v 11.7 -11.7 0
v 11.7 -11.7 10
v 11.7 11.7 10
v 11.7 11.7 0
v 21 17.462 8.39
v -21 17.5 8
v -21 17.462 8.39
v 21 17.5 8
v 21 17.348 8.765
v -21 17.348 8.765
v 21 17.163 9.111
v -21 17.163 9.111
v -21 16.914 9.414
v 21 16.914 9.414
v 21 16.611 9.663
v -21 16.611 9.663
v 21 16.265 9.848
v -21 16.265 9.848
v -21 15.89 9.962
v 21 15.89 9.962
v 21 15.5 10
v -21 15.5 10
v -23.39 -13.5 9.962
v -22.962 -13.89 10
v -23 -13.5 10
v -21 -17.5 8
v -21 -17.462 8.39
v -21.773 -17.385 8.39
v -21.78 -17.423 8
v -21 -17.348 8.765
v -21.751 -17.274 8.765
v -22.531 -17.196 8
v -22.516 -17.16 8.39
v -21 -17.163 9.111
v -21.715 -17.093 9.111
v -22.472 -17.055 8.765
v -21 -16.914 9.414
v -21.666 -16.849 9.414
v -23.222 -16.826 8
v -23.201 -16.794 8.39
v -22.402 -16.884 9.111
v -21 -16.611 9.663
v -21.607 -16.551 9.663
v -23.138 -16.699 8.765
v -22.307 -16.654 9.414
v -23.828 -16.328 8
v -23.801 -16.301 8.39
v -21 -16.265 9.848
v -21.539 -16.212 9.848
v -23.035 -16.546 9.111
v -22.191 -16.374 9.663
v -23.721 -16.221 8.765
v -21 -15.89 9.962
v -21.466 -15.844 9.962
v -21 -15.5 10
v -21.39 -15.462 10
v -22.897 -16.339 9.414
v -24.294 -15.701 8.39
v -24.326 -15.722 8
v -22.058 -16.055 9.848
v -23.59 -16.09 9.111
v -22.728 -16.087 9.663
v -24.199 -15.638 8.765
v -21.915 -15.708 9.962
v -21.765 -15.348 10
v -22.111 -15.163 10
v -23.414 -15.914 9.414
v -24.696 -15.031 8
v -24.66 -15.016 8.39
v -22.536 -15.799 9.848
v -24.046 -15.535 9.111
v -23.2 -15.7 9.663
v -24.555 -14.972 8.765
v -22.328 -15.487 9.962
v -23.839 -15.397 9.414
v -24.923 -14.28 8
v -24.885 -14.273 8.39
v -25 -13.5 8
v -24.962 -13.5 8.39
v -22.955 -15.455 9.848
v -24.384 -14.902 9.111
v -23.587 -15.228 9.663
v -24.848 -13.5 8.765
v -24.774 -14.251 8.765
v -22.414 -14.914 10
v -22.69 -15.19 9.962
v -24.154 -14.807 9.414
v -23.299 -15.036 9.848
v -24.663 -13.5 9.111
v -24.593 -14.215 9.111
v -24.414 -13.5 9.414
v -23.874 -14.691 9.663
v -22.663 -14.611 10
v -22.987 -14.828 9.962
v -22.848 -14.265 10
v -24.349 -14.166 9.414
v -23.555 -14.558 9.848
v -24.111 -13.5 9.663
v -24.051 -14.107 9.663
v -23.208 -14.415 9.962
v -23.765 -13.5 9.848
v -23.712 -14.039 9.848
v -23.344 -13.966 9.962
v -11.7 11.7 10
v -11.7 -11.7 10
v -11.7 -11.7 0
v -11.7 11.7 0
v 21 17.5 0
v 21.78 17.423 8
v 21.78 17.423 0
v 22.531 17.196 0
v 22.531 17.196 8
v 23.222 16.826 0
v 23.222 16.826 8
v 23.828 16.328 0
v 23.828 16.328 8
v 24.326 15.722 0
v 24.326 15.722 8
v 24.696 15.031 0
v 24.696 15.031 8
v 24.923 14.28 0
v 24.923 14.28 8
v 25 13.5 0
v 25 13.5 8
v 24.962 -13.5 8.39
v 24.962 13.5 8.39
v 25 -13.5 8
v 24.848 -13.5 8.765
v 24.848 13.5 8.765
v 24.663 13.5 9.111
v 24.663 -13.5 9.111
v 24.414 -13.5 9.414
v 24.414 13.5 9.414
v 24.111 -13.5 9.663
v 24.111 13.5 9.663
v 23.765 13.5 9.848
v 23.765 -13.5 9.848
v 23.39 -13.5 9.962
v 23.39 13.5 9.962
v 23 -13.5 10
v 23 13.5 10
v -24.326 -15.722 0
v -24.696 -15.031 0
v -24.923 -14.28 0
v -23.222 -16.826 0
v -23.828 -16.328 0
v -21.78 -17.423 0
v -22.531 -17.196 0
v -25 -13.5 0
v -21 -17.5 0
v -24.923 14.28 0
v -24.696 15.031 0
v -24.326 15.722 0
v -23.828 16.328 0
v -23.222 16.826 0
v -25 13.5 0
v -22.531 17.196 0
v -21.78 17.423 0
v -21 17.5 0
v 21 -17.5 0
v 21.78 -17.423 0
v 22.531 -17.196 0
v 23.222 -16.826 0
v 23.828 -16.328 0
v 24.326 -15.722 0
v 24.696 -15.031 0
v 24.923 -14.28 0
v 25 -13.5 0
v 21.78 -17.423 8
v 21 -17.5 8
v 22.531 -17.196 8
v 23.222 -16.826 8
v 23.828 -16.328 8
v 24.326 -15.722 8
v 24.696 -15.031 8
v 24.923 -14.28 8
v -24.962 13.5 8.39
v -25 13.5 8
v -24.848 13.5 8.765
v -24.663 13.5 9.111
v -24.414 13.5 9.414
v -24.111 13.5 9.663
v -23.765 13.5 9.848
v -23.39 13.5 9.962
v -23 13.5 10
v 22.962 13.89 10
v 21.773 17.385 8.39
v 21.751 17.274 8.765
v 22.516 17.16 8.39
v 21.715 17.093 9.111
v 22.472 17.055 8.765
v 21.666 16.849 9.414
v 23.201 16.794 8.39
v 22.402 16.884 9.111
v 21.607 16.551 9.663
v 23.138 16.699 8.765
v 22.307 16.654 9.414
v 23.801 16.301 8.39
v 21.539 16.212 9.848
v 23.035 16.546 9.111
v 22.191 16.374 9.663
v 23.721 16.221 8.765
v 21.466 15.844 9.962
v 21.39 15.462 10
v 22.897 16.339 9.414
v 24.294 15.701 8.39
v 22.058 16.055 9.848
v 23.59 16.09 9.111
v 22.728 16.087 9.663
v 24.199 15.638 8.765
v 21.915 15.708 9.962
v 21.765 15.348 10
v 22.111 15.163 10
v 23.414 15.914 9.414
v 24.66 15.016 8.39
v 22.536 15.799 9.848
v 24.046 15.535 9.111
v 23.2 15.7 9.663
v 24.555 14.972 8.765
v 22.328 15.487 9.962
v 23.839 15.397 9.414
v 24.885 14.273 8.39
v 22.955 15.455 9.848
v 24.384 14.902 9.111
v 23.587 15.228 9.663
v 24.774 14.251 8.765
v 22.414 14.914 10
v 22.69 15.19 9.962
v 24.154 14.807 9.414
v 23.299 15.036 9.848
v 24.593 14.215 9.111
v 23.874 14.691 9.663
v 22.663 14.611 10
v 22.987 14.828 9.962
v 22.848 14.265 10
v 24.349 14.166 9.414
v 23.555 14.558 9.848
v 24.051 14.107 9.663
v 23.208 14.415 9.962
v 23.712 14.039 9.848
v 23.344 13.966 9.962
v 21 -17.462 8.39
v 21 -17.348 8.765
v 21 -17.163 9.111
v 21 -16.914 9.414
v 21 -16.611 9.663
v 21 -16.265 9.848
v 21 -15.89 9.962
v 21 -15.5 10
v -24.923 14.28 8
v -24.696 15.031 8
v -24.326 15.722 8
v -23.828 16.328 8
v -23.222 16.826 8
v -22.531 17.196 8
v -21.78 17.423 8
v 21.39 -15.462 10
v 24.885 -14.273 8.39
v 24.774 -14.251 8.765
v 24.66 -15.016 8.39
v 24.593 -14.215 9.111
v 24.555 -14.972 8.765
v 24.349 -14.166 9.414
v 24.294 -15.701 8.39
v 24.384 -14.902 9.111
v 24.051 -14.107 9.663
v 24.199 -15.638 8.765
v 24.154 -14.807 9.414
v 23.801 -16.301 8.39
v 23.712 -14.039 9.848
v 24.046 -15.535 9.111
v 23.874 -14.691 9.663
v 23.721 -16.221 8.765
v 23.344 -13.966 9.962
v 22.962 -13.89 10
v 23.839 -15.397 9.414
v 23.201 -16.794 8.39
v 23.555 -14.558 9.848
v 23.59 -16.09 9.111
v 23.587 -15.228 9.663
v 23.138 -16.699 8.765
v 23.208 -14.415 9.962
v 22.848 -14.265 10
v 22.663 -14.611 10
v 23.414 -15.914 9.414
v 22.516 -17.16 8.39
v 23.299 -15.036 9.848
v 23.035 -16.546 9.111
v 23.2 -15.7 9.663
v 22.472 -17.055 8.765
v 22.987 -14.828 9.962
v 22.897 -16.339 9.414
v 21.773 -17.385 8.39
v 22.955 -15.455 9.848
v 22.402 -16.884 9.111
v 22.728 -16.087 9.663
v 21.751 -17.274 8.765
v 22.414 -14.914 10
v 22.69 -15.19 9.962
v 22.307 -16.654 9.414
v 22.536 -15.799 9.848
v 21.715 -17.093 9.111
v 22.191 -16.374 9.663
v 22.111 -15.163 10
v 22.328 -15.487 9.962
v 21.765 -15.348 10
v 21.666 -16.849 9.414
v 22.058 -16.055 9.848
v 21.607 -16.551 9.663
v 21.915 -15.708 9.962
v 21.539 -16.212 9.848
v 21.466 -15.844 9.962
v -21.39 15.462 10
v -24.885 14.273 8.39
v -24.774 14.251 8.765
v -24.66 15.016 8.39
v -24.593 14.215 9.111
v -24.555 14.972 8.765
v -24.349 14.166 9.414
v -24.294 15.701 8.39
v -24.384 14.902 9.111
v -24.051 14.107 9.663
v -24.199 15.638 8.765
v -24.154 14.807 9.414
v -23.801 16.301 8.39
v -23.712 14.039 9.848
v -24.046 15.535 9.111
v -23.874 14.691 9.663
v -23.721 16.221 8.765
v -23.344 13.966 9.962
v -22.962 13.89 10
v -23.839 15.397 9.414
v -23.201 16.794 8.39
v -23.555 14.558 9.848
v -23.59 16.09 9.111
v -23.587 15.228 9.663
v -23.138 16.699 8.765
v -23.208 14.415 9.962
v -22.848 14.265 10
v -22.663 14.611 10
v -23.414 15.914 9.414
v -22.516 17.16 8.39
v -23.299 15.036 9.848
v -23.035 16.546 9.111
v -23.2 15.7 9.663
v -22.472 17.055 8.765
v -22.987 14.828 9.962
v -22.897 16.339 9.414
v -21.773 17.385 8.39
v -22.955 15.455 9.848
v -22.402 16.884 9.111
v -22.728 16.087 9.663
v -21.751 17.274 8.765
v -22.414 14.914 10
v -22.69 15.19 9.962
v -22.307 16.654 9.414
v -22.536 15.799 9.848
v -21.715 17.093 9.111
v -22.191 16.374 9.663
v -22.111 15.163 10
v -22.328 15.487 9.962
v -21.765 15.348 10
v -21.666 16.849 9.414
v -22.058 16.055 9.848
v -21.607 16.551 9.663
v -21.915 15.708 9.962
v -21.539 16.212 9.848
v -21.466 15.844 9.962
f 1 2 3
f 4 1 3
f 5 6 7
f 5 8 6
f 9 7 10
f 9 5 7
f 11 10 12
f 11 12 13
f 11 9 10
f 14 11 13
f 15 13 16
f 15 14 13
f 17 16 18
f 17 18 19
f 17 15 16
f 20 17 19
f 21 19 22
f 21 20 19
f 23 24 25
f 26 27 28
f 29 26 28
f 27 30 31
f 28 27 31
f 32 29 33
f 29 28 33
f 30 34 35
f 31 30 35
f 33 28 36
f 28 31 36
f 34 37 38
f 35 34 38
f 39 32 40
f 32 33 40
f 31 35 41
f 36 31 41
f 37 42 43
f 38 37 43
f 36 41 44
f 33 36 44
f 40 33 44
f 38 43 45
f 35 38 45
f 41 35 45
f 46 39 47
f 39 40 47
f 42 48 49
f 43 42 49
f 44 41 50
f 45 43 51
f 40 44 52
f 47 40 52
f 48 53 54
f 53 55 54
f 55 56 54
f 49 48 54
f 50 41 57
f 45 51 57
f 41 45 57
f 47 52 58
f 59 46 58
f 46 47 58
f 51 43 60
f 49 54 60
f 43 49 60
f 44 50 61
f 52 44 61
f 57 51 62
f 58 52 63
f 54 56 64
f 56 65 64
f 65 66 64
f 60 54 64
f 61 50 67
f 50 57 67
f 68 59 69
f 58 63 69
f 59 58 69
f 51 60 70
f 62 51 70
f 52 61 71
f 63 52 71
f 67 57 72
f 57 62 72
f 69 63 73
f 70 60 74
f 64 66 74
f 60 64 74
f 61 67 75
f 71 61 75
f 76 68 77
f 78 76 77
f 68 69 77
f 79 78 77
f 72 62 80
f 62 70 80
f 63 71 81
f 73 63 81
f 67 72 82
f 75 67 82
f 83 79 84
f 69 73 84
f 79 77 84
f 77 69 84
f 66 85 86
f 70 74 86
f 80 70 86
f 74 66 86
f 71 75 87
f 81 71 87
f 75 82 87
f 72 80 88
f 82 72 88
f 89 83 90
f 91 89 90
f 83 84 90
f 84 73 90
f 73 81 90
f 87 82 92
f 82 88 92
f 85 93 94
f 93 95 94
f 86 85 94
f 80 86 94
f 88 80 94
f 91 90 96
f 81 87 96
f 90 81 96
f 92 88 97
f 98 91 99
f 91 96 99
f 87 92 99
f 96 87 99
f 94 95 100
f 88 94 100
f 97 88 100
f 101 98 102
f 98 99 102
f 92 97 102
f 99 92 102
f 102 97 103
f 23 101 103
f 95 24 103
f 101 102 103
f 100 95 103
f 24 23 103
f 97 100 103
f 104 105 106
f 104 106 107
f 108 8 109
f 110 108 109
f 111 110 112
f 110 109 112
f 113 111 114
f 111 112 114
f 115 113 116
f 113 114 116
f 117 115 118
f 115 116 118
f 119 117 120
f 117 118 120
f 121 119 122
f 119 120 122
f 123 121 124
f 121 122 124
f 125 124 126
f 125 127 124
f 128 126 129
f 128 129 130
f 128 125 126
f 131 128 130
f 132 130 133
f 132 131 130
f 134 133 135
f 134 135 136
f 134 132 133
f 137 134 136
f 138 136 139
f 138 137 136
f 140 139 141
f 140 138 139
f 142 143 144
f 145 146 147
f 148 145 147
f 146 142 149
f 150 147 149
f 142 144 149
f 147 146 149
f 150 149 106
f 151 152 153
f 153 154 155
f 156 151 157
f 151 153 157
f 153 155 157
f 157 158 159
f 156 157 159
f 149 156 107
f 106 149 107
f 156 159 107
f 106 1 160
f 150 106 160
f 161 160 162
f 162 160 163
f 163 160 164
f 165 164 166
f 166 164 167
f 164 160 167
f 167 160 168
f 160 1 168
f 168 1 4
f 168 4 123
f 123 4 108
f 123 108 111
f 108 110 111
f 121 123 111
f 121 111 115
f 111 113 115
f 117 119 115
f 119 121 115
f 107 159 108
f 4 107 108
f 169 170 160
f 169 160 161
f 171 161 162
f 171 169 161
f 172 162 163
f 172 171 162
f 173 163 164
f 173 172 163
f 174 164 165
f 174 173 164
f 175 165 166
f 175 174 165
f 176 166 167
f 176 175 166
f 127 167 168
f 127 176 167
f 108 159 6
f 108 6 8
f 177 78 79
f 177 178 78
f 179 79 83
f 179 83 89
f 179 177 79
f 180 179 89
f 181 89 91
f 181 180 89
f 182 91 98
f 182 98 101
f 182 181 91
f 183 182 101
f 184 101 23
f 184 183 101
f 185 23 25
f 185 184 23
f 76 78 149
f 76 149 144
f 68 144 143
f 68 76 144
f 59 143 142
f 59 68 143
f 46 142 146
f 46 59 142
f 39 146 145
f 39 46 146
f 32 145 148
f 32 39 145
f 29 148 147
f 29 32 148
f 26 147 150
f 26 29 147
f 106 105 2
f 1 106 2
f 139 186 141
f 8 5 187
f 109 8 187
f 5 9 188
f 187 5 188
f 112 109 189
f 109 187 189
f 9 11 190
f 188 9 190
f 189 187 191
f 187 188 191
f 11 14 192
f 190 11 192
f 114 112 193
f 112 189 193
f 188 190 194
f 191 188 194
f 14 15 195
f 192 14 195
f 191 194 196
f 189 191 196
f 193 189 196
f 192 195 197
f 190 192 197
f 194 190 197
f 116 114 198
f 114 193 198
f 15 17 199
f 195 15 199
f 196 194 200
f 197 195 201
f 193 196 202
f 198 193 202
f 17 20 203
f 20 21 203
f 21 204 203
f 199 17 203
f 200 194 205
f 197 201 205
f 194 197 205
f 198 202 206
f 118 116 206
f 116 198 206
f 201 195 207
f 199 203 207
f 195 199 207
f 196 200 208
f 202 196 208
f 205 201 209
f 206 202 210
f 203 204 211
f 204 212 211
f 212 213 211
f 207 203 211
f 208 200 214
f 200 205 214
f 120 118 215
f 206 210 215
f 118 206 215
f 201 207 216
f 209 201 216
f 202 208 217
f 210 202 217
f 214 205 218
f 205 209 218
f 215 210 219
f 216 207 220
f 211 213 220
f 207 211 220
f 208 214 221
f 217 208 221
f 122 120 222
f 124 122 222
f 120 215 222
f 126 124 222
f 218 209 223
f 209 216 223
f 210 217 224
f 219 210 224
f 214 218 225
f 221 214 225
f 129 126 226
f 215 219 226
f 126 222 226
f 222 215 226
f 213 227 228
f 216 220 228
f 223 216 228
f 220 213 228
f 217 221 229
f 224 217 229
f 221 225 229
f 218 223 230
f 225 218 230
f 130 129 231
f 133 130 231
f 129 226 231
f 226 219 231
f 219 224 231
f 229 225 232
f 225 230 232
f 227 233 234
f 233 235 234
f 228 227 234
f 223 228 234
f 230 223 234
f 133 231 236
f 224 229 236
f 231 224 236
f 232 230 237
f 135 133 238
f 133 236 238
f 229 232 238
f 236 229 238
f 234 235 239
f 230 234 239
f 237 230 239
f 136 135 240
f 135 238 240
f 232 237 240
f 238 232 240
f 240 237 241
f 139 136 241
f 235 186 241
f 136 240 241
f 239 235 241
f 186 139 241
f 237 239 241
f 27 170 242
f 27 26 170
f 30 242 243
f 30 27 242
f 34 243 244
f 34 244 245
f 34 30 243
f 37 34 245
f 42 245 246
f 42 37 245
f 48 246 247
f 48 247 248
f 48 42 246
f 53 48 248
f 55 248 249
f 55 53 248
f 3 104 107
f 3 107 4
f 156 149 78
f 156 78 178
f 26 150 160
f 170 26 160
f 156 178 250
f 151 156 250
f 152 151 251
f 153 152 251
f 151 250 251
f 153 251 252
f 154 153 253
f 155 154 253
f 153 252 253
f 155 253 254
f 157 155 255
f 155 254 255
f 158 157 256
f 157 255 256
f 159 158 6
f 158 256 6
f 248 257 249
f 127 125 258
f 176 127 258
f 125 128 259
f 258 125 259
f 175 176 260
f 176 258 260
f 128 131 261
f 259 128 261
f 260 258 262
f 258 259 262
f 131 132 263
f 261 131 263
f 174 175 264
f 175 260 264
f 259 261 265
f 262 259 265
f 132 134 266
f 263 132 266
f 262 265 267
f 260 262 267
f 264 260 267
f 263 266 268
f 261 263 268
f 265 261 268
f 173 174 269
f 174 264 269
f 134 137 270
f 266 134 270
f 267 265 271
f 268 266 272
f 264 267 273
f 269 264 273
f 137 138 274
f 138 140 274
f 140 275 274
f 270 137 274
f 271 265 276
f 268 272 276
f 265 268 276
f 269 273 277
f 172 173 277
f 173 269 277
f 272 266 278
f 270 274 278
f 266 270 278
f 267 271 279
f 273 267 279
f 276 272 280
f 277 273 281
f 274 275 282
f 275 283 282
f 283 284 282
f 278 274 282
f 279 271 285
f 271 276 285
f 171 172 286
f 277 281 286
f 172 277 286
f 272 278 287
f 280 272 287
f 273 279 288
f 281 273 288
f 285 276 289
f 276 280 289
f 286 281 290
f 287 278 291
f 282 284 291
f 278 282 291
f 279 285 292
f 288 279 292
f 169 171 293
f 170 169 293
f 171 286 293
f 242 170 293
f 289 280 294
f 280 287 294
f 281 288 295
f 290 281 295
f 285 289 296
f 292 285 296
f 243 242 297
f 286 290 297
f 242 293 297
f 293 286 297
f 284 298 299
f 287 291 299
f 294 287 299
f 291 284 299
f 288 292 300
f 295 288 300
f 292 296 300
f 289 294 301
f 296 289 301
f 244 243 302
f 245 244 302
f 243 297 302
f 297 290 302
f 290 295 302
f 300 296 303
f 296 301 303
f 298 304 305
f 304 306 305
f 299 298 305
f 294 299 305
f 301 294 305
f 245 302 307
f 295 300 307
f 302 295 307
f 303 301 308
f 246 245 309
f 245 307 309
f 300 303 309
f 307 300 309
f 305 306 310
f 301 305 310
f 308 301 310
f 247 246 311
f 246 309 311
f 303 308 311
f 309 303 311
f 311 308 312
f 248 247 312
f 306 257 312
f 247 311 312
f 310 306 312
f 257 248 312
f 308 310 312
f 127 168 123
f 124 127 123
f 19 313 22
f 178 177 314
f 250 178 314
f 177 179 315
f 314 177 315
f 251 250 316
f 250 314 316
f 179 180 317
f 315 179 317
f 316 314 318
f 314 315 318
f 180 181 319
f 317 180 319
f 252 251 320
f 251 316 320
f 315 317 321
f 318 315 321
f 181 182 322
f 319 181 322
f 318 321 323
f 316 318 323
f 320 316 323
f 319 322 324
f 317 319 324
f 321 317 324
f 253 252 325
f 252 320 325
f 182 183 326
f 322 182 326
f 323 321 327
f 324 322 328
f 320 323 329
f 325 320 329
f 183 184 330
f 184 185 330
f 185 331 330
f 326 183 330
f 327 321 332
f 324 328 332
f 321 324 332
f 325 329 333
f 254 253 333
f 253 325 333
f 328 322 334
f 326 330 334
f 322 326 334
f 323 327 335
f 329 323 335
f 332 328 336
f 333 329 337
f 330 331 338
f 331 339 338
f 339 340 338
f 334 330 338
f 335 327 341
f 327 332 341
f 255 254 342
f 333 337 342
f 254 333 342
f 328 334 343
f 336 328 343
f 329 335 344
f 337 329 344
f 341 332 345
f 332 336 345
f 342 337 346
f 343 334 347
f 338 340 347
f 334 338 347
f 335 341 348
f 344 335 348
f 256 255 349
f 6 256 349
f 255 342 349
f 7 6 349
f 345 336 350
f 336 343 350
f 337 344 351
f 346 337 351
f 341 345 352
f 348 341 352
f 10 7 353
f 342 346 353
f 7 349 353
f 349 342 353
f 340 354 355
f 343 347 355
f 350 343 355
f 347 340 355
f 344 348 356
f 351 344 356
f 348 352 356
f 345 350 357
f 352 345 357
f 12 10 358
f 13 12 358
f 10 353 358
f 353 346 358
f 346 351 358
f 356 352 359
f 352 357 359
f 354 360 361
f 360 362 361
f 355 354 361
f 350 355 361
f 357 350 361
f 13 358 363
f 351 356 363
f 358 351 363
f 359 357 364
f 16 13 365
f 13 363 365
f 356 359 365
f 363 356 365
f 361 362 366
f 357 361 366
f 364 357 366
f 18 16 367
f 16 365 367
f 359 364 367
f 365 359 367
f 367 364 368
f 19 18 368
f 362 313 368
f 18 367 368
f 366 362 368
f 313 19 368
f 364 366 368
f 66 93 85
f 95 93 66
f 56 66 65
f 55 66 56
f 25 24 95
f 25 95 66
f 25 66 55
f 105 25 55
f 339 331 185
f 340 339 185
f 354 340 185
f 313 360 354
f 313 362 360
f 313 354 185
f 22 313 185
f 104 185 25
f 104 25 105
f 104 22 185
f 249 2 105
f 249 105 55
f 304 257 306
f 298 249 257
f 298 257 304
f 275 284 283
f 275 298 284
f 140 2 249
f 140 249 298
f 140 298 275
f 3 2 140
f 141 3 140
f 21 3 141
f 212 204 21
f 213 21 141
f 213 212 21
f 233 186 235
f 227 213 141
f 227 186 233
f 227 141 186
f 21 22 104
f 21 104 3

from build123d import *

# Parameters (mm, degrees)
SKETCH_W     = 50
SKETCH_H     = 35
PAD_DEPTH    = 10
SKETCH001_W  = 23.4
SKETCH001_H  = 23.4
POCKET_DEPTH = 10.001
FILLET_R     = 4
FILLET001_R  = 2


with BuildPart() as part:
    # Sketch → Pad (new body)
    with BuildSketch(Plane.XY):
        Rectangle(SKETCH_W, SKETCH_H)
    extrude(amount=PAD_DEPTH)

    # Sketch001 (on Face6 of Pad) → Pocket (cut, through all)
    with BuildSketch(Plane.XY.offset(10)):
        Rectangle(SKETCH001_W, SKETCH001_H)
    extrude(amount=-POCKET_DEPTH, mode=Mode.SUBTRACT)

    # Fillet
    fillet_edges = [part.edges().sort_by_distance(p)[0] for p in [
        (-25, 17.5, 5),
        (-25, -17.5, 5),
        (25, -17.5, 5),
        (25, 17.5, 5),
    ]]
    fillet(fillet_edges, radius=FILLET_R)

    # Fillet001
    fillet001_edges = [part.edges().sort_by_distance(p)[0] for p in [
        (-25, 0, 10),
        (-23.828427, 16.328427, 10),
        (0, 17.5, 10),
        (23.828427, 16.328427, 10),
        (25, 0, 10),
        (23.828427, -16.328427, 10),
        (0, -17.5, 10),
        (-23.828427, -16.328427, 10),
    ]]
    fillet(fillet001_edges, radius=FILLET001_R)


solid = part.part
